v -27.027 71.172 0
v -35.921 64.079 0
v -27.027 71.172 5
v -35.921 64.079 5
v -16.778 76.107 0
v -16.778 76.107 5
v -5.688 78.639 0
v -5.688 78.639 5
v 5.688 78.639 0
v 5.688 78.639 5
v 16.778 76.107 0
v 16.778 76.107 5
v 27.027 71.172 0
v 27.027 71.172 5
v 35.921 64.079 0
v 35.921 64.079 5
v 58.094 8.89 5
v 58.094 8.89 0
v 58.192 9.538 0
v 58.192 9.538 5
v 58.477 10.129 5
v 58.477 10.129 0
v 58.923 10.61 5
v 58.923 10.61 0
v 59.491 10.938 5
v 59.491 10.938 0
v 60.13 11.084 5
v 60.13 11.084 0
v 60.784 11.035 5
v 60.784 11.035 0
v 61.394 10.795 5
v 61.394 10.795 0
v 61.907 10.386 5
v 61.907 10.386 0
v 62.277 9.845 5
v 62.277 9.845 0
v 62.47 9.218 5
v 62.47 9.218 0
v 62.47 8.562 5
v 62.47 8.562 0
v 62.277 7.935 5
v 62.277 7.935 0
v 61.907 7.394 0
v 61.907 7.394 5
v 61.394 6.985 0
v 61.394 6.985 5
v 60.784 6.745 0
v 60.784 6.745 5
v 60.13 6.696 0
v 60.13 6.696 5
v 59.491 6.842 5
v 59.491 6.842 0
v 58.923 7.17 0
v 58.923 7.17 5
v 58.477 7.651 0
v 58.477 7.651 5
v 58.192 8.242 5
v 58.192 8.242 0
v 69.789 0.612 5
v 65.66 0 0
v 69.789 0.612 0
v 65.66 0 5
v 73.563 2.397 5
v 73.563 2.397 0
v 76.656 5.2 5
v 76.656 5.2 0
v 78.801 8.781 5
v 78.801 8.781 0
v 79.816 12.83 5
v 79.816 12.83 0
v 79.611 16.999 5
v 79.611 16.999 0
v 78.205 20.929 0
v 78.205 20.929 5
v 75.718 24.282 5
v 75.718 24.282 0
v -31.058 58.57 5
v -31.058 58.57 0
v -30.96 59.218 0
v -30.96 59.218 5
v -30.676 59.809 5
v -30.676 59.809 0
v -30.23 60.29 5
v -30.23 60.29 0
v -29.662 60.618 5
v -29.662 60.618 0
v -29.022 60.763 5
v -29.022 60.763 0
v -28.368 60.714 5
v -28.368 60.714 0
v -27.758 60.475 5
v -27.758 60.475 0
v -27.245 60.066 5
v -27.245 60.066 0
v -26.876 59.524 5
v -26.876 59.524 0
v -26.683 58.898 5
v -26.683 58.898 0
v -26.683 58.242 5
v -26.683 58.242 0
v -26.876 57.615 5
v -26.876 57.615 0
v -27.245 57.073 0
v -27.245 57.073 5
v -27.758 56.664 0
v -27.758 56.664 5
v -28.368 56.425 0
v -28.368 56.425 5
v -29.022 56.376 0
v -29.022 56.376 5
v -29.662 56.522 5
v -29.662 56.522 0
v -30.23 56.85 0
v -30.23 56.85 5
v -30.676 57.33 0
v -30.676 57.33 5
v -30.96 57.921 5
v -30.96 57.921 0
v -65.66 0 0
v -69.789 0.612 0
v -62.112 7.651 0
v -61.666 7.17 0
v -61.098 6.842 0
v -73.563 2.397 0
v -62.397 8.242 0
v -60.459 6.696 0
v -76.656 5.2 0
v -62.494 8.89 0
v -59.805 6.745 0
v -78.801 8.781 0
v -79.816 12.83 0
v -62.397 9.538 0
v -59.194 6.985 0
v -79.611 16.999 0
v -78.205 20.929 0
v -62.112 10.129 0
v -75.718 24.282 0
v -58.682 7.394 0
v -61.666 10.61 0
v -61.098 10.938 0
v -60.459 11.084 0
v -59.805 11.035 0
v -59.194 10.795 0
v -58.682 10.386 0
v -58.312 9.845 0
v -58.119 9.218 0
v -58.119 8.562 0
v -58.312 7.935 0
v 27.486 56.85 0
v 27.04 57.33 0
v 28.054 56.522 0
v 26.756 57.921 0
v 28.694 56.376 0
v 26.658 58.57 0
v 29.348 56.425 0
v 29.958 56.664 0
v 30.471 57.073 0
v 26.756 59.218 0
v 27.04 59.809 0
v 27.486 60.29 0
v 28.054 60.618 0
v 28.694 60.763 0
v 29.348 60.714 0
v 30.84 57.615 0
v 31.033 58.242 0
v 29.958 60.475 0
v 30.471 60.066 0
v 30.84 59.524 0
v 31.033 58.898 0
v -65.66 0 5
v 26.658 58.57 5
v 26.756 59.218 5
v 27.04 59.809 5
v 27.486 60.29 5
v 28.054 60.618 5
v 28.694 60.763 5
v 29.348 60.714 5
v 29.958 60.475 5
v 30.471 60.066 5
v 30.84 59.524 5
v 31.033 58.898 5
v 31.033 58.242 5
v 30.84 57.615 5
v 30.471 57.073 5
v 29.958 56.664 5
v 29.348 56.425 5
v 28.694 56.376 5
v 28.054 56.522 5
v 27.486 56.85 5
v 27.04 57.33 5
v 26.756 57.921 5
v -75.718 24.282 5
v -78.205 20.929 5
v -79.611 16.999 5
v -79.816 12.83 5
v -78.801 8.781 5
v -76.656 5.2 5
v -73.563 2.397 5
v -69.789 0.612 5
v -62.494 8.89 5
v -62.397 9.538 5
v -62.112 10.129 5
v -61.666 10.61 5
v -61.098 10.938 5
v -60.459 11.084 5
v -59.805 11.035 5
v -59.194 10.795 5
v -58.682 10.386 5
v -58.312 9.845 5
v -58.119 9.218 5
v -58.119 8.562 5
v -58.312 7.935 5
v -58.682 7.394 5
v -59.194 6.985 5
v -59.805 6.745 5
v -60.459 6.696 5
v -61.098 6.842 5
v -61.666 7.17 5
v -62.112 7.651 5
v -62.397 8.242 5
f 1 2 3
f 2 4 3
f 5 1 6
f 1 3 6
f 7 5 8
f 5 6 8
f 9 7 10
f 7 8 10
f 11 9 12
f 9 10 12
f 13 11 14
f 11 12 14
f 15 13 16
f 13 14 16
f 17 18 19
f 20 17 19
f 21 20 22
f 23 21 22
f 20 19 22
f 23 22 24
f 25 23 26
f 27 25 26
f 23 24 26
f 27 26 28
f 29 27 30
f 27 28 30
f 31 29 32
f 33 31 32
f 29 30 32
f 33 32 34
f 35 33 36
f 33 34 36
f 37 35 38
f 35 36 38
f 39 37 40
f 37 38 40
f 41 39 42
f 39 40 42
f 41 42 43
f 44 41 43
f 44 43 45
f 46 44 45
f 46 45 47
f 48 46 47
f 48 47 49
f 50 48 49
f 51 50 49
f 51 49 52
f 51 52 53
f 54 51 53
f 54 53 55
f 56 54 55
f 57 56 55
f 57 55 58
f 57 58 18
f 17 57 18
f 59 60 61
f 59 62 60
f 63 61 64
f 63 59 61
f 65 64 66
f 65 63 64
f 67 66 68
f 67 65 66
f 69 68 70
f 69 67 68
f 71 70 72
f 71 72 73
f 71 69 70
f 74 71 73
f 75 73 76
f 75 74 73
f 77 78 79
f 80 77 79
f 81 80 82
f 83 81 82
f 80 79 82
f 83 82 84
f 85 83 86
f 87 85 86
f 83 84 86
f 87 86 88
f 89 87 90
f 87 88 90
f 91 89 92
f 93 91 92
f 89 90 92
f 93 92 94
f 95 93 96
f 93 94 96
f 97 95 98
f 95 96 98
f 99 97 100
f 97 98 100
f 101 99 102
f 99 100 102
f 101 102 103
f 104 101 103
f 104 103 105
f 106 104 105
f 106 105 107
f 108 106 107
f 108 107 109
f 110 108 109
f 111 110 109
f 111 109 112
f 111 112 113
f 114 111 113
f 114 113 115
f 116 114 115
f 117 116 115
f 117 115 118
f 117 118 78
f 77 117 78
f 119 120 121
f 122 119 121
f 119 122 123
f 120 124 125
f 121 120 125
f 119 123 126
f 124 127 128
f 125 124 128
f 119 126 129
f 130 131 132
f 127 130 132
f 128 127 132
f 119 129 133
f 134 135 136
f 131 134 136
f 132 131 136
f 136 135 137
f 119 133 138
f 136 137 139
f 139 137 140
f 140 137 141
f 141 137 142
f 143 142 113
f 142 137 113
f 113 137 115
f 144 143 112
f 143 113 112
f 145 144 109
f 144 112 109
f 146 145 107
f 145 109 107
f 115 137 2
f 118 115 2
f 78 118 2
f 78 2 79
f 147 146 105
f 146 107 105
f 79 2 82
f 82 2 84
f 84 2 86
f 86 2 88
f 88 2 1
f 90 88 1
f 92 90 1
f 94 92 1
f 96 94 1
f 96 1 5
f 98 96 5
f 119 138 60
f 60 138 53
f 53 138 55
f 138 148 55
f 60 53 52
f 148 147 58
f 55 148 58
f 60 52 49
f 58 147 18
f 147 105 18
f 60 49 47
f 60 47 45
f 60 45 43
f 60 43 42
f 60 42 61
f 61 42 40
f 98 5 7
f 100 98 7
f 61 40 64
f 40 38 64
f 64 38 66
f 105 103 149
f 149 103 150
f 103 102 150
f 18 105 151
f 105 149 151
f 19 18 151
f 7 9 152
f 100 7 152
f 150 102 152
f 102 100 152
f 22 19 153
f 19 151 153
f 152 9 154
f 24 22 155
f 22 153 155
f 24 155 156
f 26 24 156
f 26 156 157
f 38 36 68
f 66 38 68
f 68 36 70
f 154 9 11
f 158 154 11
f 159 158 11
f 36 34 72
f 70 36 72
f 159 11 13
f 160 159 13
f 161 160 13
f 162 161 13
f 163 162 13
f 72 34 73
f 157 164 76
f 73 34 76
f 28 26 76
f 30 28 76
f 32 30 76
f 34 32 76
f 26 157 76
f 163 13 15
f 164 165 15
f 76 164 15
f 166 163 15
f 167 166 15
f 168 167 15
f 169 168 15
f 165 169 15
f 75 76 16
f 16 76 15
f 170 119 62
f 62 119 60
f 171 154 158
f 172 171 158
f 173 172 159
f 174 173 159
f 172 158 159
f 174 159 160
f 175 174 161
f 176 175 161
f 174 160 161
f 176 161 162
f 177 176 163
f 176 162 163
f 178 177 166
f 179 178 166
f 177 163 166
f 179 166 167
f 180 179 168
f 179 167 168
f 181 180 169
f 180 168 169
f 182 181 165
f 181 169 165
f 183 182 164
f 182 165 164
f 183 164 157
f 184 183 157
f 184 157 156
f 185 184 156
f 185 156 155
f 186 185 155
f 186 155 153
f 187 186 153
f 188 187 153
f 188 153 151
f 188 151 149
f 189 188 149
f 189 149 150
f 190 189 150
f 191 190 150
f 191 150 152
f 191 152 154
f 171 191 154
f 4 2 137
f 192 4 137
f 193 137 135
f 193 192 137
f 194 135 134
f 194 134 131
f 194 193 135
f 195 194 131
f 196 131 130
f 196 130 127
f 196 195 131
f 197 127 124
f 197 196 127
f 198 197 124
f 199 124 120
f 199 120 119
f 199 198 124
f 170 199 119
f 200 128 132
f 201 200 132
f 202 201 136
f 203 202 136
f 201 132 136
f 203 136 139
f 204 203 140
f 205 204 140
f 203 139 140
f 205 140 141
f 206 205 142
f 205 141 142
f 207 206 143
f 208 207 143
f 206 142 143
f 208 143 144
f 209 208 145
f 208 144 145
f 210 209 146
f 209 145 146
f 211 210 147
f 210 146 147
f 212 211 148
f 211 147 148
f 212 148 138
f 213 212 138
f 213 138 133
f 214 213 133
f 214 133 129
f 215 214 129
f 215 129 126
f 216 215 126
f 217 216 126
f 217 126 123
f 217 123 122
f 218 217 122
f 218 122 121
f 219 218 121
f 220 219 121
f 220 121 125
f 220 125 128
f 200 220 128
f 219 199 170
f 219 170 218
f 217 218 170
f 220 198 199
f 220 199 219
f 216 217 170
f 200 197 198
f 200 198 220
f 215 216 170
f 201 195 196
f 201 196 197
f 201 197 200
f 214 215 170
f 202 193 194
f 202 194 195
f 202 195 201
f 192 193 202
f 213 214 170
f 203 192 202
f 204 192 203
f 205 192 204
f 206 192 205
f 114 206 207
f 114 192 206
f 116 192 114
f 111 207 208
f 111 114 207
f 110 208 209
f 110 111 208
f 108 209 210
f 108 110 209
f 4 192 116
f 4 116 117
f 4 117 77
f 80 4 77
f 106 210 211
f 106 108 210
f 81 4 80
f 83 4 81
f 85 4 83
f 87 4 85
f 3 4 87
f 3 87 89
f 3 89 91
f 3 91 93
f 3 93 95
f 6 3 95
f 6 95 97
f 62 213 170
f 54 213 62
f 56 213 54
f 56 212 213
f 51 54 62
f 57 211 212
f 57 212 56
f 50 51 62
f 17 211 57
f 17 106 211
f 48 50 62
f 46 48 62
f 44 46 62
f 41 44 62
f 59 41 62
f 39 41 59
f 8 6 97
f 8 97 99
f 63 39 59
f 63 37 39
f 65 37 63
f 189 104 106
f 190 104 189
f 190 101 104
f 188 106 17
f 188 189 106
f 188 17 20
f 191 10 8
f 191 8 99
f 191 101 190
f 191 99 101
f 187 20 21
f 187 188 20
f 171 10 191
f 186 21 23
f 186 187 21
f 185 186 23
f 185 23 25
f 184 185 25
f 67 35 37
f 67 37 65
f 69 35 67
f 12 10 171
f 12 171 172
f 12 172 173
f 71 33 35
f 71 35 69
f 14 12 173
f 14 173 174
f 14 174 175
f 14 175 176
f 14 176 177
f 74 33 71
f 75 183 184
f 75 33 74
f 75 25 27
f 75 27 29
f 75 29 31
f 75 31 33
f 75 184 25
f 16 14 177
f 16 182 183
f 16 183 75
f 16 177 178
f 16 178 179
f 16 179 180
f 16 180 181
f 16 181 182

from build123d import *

# Parameters (mm, degrees)
F1_DEPTH = 5
F2_R     = 50.8
F3_R     = 14.224
F5_D     = 4.4


with BuildPart() as f1:
    # F0 (on Top) → F1 (new body)
    with BuildSketch(Plane.XY):
        Polygon((0, 100), (-100, 0), (100, 0), align=None)
    extrude(amount=F1_DEPTH)

    # F2
    f2_edges = [f1.edges().sort_by_distance(p)[0] for p in [
        (0, 100, 2.5),
    ]]
    fillet(f2_edges, radius=F2_R)

    # F3
    f3_edges = [f1.edges().sort_by_distance(p)[0] for p in [
        (-100, 0, 2.5),
        (100, 0, 2.5),
    ]]
    fillet(f3_edges, radius=F3_R)

    # F5 (through all)
    with Locations(Plane.XY.offset(5)):
        with Locations((-28.8579897851, 58.5696516454), (28.8579897851, 58.5696516454), (60.2944809943, 8.89), (-60.2944809943, 8.89)):
            Hole(F5_D / 2)


solid = f1.part
